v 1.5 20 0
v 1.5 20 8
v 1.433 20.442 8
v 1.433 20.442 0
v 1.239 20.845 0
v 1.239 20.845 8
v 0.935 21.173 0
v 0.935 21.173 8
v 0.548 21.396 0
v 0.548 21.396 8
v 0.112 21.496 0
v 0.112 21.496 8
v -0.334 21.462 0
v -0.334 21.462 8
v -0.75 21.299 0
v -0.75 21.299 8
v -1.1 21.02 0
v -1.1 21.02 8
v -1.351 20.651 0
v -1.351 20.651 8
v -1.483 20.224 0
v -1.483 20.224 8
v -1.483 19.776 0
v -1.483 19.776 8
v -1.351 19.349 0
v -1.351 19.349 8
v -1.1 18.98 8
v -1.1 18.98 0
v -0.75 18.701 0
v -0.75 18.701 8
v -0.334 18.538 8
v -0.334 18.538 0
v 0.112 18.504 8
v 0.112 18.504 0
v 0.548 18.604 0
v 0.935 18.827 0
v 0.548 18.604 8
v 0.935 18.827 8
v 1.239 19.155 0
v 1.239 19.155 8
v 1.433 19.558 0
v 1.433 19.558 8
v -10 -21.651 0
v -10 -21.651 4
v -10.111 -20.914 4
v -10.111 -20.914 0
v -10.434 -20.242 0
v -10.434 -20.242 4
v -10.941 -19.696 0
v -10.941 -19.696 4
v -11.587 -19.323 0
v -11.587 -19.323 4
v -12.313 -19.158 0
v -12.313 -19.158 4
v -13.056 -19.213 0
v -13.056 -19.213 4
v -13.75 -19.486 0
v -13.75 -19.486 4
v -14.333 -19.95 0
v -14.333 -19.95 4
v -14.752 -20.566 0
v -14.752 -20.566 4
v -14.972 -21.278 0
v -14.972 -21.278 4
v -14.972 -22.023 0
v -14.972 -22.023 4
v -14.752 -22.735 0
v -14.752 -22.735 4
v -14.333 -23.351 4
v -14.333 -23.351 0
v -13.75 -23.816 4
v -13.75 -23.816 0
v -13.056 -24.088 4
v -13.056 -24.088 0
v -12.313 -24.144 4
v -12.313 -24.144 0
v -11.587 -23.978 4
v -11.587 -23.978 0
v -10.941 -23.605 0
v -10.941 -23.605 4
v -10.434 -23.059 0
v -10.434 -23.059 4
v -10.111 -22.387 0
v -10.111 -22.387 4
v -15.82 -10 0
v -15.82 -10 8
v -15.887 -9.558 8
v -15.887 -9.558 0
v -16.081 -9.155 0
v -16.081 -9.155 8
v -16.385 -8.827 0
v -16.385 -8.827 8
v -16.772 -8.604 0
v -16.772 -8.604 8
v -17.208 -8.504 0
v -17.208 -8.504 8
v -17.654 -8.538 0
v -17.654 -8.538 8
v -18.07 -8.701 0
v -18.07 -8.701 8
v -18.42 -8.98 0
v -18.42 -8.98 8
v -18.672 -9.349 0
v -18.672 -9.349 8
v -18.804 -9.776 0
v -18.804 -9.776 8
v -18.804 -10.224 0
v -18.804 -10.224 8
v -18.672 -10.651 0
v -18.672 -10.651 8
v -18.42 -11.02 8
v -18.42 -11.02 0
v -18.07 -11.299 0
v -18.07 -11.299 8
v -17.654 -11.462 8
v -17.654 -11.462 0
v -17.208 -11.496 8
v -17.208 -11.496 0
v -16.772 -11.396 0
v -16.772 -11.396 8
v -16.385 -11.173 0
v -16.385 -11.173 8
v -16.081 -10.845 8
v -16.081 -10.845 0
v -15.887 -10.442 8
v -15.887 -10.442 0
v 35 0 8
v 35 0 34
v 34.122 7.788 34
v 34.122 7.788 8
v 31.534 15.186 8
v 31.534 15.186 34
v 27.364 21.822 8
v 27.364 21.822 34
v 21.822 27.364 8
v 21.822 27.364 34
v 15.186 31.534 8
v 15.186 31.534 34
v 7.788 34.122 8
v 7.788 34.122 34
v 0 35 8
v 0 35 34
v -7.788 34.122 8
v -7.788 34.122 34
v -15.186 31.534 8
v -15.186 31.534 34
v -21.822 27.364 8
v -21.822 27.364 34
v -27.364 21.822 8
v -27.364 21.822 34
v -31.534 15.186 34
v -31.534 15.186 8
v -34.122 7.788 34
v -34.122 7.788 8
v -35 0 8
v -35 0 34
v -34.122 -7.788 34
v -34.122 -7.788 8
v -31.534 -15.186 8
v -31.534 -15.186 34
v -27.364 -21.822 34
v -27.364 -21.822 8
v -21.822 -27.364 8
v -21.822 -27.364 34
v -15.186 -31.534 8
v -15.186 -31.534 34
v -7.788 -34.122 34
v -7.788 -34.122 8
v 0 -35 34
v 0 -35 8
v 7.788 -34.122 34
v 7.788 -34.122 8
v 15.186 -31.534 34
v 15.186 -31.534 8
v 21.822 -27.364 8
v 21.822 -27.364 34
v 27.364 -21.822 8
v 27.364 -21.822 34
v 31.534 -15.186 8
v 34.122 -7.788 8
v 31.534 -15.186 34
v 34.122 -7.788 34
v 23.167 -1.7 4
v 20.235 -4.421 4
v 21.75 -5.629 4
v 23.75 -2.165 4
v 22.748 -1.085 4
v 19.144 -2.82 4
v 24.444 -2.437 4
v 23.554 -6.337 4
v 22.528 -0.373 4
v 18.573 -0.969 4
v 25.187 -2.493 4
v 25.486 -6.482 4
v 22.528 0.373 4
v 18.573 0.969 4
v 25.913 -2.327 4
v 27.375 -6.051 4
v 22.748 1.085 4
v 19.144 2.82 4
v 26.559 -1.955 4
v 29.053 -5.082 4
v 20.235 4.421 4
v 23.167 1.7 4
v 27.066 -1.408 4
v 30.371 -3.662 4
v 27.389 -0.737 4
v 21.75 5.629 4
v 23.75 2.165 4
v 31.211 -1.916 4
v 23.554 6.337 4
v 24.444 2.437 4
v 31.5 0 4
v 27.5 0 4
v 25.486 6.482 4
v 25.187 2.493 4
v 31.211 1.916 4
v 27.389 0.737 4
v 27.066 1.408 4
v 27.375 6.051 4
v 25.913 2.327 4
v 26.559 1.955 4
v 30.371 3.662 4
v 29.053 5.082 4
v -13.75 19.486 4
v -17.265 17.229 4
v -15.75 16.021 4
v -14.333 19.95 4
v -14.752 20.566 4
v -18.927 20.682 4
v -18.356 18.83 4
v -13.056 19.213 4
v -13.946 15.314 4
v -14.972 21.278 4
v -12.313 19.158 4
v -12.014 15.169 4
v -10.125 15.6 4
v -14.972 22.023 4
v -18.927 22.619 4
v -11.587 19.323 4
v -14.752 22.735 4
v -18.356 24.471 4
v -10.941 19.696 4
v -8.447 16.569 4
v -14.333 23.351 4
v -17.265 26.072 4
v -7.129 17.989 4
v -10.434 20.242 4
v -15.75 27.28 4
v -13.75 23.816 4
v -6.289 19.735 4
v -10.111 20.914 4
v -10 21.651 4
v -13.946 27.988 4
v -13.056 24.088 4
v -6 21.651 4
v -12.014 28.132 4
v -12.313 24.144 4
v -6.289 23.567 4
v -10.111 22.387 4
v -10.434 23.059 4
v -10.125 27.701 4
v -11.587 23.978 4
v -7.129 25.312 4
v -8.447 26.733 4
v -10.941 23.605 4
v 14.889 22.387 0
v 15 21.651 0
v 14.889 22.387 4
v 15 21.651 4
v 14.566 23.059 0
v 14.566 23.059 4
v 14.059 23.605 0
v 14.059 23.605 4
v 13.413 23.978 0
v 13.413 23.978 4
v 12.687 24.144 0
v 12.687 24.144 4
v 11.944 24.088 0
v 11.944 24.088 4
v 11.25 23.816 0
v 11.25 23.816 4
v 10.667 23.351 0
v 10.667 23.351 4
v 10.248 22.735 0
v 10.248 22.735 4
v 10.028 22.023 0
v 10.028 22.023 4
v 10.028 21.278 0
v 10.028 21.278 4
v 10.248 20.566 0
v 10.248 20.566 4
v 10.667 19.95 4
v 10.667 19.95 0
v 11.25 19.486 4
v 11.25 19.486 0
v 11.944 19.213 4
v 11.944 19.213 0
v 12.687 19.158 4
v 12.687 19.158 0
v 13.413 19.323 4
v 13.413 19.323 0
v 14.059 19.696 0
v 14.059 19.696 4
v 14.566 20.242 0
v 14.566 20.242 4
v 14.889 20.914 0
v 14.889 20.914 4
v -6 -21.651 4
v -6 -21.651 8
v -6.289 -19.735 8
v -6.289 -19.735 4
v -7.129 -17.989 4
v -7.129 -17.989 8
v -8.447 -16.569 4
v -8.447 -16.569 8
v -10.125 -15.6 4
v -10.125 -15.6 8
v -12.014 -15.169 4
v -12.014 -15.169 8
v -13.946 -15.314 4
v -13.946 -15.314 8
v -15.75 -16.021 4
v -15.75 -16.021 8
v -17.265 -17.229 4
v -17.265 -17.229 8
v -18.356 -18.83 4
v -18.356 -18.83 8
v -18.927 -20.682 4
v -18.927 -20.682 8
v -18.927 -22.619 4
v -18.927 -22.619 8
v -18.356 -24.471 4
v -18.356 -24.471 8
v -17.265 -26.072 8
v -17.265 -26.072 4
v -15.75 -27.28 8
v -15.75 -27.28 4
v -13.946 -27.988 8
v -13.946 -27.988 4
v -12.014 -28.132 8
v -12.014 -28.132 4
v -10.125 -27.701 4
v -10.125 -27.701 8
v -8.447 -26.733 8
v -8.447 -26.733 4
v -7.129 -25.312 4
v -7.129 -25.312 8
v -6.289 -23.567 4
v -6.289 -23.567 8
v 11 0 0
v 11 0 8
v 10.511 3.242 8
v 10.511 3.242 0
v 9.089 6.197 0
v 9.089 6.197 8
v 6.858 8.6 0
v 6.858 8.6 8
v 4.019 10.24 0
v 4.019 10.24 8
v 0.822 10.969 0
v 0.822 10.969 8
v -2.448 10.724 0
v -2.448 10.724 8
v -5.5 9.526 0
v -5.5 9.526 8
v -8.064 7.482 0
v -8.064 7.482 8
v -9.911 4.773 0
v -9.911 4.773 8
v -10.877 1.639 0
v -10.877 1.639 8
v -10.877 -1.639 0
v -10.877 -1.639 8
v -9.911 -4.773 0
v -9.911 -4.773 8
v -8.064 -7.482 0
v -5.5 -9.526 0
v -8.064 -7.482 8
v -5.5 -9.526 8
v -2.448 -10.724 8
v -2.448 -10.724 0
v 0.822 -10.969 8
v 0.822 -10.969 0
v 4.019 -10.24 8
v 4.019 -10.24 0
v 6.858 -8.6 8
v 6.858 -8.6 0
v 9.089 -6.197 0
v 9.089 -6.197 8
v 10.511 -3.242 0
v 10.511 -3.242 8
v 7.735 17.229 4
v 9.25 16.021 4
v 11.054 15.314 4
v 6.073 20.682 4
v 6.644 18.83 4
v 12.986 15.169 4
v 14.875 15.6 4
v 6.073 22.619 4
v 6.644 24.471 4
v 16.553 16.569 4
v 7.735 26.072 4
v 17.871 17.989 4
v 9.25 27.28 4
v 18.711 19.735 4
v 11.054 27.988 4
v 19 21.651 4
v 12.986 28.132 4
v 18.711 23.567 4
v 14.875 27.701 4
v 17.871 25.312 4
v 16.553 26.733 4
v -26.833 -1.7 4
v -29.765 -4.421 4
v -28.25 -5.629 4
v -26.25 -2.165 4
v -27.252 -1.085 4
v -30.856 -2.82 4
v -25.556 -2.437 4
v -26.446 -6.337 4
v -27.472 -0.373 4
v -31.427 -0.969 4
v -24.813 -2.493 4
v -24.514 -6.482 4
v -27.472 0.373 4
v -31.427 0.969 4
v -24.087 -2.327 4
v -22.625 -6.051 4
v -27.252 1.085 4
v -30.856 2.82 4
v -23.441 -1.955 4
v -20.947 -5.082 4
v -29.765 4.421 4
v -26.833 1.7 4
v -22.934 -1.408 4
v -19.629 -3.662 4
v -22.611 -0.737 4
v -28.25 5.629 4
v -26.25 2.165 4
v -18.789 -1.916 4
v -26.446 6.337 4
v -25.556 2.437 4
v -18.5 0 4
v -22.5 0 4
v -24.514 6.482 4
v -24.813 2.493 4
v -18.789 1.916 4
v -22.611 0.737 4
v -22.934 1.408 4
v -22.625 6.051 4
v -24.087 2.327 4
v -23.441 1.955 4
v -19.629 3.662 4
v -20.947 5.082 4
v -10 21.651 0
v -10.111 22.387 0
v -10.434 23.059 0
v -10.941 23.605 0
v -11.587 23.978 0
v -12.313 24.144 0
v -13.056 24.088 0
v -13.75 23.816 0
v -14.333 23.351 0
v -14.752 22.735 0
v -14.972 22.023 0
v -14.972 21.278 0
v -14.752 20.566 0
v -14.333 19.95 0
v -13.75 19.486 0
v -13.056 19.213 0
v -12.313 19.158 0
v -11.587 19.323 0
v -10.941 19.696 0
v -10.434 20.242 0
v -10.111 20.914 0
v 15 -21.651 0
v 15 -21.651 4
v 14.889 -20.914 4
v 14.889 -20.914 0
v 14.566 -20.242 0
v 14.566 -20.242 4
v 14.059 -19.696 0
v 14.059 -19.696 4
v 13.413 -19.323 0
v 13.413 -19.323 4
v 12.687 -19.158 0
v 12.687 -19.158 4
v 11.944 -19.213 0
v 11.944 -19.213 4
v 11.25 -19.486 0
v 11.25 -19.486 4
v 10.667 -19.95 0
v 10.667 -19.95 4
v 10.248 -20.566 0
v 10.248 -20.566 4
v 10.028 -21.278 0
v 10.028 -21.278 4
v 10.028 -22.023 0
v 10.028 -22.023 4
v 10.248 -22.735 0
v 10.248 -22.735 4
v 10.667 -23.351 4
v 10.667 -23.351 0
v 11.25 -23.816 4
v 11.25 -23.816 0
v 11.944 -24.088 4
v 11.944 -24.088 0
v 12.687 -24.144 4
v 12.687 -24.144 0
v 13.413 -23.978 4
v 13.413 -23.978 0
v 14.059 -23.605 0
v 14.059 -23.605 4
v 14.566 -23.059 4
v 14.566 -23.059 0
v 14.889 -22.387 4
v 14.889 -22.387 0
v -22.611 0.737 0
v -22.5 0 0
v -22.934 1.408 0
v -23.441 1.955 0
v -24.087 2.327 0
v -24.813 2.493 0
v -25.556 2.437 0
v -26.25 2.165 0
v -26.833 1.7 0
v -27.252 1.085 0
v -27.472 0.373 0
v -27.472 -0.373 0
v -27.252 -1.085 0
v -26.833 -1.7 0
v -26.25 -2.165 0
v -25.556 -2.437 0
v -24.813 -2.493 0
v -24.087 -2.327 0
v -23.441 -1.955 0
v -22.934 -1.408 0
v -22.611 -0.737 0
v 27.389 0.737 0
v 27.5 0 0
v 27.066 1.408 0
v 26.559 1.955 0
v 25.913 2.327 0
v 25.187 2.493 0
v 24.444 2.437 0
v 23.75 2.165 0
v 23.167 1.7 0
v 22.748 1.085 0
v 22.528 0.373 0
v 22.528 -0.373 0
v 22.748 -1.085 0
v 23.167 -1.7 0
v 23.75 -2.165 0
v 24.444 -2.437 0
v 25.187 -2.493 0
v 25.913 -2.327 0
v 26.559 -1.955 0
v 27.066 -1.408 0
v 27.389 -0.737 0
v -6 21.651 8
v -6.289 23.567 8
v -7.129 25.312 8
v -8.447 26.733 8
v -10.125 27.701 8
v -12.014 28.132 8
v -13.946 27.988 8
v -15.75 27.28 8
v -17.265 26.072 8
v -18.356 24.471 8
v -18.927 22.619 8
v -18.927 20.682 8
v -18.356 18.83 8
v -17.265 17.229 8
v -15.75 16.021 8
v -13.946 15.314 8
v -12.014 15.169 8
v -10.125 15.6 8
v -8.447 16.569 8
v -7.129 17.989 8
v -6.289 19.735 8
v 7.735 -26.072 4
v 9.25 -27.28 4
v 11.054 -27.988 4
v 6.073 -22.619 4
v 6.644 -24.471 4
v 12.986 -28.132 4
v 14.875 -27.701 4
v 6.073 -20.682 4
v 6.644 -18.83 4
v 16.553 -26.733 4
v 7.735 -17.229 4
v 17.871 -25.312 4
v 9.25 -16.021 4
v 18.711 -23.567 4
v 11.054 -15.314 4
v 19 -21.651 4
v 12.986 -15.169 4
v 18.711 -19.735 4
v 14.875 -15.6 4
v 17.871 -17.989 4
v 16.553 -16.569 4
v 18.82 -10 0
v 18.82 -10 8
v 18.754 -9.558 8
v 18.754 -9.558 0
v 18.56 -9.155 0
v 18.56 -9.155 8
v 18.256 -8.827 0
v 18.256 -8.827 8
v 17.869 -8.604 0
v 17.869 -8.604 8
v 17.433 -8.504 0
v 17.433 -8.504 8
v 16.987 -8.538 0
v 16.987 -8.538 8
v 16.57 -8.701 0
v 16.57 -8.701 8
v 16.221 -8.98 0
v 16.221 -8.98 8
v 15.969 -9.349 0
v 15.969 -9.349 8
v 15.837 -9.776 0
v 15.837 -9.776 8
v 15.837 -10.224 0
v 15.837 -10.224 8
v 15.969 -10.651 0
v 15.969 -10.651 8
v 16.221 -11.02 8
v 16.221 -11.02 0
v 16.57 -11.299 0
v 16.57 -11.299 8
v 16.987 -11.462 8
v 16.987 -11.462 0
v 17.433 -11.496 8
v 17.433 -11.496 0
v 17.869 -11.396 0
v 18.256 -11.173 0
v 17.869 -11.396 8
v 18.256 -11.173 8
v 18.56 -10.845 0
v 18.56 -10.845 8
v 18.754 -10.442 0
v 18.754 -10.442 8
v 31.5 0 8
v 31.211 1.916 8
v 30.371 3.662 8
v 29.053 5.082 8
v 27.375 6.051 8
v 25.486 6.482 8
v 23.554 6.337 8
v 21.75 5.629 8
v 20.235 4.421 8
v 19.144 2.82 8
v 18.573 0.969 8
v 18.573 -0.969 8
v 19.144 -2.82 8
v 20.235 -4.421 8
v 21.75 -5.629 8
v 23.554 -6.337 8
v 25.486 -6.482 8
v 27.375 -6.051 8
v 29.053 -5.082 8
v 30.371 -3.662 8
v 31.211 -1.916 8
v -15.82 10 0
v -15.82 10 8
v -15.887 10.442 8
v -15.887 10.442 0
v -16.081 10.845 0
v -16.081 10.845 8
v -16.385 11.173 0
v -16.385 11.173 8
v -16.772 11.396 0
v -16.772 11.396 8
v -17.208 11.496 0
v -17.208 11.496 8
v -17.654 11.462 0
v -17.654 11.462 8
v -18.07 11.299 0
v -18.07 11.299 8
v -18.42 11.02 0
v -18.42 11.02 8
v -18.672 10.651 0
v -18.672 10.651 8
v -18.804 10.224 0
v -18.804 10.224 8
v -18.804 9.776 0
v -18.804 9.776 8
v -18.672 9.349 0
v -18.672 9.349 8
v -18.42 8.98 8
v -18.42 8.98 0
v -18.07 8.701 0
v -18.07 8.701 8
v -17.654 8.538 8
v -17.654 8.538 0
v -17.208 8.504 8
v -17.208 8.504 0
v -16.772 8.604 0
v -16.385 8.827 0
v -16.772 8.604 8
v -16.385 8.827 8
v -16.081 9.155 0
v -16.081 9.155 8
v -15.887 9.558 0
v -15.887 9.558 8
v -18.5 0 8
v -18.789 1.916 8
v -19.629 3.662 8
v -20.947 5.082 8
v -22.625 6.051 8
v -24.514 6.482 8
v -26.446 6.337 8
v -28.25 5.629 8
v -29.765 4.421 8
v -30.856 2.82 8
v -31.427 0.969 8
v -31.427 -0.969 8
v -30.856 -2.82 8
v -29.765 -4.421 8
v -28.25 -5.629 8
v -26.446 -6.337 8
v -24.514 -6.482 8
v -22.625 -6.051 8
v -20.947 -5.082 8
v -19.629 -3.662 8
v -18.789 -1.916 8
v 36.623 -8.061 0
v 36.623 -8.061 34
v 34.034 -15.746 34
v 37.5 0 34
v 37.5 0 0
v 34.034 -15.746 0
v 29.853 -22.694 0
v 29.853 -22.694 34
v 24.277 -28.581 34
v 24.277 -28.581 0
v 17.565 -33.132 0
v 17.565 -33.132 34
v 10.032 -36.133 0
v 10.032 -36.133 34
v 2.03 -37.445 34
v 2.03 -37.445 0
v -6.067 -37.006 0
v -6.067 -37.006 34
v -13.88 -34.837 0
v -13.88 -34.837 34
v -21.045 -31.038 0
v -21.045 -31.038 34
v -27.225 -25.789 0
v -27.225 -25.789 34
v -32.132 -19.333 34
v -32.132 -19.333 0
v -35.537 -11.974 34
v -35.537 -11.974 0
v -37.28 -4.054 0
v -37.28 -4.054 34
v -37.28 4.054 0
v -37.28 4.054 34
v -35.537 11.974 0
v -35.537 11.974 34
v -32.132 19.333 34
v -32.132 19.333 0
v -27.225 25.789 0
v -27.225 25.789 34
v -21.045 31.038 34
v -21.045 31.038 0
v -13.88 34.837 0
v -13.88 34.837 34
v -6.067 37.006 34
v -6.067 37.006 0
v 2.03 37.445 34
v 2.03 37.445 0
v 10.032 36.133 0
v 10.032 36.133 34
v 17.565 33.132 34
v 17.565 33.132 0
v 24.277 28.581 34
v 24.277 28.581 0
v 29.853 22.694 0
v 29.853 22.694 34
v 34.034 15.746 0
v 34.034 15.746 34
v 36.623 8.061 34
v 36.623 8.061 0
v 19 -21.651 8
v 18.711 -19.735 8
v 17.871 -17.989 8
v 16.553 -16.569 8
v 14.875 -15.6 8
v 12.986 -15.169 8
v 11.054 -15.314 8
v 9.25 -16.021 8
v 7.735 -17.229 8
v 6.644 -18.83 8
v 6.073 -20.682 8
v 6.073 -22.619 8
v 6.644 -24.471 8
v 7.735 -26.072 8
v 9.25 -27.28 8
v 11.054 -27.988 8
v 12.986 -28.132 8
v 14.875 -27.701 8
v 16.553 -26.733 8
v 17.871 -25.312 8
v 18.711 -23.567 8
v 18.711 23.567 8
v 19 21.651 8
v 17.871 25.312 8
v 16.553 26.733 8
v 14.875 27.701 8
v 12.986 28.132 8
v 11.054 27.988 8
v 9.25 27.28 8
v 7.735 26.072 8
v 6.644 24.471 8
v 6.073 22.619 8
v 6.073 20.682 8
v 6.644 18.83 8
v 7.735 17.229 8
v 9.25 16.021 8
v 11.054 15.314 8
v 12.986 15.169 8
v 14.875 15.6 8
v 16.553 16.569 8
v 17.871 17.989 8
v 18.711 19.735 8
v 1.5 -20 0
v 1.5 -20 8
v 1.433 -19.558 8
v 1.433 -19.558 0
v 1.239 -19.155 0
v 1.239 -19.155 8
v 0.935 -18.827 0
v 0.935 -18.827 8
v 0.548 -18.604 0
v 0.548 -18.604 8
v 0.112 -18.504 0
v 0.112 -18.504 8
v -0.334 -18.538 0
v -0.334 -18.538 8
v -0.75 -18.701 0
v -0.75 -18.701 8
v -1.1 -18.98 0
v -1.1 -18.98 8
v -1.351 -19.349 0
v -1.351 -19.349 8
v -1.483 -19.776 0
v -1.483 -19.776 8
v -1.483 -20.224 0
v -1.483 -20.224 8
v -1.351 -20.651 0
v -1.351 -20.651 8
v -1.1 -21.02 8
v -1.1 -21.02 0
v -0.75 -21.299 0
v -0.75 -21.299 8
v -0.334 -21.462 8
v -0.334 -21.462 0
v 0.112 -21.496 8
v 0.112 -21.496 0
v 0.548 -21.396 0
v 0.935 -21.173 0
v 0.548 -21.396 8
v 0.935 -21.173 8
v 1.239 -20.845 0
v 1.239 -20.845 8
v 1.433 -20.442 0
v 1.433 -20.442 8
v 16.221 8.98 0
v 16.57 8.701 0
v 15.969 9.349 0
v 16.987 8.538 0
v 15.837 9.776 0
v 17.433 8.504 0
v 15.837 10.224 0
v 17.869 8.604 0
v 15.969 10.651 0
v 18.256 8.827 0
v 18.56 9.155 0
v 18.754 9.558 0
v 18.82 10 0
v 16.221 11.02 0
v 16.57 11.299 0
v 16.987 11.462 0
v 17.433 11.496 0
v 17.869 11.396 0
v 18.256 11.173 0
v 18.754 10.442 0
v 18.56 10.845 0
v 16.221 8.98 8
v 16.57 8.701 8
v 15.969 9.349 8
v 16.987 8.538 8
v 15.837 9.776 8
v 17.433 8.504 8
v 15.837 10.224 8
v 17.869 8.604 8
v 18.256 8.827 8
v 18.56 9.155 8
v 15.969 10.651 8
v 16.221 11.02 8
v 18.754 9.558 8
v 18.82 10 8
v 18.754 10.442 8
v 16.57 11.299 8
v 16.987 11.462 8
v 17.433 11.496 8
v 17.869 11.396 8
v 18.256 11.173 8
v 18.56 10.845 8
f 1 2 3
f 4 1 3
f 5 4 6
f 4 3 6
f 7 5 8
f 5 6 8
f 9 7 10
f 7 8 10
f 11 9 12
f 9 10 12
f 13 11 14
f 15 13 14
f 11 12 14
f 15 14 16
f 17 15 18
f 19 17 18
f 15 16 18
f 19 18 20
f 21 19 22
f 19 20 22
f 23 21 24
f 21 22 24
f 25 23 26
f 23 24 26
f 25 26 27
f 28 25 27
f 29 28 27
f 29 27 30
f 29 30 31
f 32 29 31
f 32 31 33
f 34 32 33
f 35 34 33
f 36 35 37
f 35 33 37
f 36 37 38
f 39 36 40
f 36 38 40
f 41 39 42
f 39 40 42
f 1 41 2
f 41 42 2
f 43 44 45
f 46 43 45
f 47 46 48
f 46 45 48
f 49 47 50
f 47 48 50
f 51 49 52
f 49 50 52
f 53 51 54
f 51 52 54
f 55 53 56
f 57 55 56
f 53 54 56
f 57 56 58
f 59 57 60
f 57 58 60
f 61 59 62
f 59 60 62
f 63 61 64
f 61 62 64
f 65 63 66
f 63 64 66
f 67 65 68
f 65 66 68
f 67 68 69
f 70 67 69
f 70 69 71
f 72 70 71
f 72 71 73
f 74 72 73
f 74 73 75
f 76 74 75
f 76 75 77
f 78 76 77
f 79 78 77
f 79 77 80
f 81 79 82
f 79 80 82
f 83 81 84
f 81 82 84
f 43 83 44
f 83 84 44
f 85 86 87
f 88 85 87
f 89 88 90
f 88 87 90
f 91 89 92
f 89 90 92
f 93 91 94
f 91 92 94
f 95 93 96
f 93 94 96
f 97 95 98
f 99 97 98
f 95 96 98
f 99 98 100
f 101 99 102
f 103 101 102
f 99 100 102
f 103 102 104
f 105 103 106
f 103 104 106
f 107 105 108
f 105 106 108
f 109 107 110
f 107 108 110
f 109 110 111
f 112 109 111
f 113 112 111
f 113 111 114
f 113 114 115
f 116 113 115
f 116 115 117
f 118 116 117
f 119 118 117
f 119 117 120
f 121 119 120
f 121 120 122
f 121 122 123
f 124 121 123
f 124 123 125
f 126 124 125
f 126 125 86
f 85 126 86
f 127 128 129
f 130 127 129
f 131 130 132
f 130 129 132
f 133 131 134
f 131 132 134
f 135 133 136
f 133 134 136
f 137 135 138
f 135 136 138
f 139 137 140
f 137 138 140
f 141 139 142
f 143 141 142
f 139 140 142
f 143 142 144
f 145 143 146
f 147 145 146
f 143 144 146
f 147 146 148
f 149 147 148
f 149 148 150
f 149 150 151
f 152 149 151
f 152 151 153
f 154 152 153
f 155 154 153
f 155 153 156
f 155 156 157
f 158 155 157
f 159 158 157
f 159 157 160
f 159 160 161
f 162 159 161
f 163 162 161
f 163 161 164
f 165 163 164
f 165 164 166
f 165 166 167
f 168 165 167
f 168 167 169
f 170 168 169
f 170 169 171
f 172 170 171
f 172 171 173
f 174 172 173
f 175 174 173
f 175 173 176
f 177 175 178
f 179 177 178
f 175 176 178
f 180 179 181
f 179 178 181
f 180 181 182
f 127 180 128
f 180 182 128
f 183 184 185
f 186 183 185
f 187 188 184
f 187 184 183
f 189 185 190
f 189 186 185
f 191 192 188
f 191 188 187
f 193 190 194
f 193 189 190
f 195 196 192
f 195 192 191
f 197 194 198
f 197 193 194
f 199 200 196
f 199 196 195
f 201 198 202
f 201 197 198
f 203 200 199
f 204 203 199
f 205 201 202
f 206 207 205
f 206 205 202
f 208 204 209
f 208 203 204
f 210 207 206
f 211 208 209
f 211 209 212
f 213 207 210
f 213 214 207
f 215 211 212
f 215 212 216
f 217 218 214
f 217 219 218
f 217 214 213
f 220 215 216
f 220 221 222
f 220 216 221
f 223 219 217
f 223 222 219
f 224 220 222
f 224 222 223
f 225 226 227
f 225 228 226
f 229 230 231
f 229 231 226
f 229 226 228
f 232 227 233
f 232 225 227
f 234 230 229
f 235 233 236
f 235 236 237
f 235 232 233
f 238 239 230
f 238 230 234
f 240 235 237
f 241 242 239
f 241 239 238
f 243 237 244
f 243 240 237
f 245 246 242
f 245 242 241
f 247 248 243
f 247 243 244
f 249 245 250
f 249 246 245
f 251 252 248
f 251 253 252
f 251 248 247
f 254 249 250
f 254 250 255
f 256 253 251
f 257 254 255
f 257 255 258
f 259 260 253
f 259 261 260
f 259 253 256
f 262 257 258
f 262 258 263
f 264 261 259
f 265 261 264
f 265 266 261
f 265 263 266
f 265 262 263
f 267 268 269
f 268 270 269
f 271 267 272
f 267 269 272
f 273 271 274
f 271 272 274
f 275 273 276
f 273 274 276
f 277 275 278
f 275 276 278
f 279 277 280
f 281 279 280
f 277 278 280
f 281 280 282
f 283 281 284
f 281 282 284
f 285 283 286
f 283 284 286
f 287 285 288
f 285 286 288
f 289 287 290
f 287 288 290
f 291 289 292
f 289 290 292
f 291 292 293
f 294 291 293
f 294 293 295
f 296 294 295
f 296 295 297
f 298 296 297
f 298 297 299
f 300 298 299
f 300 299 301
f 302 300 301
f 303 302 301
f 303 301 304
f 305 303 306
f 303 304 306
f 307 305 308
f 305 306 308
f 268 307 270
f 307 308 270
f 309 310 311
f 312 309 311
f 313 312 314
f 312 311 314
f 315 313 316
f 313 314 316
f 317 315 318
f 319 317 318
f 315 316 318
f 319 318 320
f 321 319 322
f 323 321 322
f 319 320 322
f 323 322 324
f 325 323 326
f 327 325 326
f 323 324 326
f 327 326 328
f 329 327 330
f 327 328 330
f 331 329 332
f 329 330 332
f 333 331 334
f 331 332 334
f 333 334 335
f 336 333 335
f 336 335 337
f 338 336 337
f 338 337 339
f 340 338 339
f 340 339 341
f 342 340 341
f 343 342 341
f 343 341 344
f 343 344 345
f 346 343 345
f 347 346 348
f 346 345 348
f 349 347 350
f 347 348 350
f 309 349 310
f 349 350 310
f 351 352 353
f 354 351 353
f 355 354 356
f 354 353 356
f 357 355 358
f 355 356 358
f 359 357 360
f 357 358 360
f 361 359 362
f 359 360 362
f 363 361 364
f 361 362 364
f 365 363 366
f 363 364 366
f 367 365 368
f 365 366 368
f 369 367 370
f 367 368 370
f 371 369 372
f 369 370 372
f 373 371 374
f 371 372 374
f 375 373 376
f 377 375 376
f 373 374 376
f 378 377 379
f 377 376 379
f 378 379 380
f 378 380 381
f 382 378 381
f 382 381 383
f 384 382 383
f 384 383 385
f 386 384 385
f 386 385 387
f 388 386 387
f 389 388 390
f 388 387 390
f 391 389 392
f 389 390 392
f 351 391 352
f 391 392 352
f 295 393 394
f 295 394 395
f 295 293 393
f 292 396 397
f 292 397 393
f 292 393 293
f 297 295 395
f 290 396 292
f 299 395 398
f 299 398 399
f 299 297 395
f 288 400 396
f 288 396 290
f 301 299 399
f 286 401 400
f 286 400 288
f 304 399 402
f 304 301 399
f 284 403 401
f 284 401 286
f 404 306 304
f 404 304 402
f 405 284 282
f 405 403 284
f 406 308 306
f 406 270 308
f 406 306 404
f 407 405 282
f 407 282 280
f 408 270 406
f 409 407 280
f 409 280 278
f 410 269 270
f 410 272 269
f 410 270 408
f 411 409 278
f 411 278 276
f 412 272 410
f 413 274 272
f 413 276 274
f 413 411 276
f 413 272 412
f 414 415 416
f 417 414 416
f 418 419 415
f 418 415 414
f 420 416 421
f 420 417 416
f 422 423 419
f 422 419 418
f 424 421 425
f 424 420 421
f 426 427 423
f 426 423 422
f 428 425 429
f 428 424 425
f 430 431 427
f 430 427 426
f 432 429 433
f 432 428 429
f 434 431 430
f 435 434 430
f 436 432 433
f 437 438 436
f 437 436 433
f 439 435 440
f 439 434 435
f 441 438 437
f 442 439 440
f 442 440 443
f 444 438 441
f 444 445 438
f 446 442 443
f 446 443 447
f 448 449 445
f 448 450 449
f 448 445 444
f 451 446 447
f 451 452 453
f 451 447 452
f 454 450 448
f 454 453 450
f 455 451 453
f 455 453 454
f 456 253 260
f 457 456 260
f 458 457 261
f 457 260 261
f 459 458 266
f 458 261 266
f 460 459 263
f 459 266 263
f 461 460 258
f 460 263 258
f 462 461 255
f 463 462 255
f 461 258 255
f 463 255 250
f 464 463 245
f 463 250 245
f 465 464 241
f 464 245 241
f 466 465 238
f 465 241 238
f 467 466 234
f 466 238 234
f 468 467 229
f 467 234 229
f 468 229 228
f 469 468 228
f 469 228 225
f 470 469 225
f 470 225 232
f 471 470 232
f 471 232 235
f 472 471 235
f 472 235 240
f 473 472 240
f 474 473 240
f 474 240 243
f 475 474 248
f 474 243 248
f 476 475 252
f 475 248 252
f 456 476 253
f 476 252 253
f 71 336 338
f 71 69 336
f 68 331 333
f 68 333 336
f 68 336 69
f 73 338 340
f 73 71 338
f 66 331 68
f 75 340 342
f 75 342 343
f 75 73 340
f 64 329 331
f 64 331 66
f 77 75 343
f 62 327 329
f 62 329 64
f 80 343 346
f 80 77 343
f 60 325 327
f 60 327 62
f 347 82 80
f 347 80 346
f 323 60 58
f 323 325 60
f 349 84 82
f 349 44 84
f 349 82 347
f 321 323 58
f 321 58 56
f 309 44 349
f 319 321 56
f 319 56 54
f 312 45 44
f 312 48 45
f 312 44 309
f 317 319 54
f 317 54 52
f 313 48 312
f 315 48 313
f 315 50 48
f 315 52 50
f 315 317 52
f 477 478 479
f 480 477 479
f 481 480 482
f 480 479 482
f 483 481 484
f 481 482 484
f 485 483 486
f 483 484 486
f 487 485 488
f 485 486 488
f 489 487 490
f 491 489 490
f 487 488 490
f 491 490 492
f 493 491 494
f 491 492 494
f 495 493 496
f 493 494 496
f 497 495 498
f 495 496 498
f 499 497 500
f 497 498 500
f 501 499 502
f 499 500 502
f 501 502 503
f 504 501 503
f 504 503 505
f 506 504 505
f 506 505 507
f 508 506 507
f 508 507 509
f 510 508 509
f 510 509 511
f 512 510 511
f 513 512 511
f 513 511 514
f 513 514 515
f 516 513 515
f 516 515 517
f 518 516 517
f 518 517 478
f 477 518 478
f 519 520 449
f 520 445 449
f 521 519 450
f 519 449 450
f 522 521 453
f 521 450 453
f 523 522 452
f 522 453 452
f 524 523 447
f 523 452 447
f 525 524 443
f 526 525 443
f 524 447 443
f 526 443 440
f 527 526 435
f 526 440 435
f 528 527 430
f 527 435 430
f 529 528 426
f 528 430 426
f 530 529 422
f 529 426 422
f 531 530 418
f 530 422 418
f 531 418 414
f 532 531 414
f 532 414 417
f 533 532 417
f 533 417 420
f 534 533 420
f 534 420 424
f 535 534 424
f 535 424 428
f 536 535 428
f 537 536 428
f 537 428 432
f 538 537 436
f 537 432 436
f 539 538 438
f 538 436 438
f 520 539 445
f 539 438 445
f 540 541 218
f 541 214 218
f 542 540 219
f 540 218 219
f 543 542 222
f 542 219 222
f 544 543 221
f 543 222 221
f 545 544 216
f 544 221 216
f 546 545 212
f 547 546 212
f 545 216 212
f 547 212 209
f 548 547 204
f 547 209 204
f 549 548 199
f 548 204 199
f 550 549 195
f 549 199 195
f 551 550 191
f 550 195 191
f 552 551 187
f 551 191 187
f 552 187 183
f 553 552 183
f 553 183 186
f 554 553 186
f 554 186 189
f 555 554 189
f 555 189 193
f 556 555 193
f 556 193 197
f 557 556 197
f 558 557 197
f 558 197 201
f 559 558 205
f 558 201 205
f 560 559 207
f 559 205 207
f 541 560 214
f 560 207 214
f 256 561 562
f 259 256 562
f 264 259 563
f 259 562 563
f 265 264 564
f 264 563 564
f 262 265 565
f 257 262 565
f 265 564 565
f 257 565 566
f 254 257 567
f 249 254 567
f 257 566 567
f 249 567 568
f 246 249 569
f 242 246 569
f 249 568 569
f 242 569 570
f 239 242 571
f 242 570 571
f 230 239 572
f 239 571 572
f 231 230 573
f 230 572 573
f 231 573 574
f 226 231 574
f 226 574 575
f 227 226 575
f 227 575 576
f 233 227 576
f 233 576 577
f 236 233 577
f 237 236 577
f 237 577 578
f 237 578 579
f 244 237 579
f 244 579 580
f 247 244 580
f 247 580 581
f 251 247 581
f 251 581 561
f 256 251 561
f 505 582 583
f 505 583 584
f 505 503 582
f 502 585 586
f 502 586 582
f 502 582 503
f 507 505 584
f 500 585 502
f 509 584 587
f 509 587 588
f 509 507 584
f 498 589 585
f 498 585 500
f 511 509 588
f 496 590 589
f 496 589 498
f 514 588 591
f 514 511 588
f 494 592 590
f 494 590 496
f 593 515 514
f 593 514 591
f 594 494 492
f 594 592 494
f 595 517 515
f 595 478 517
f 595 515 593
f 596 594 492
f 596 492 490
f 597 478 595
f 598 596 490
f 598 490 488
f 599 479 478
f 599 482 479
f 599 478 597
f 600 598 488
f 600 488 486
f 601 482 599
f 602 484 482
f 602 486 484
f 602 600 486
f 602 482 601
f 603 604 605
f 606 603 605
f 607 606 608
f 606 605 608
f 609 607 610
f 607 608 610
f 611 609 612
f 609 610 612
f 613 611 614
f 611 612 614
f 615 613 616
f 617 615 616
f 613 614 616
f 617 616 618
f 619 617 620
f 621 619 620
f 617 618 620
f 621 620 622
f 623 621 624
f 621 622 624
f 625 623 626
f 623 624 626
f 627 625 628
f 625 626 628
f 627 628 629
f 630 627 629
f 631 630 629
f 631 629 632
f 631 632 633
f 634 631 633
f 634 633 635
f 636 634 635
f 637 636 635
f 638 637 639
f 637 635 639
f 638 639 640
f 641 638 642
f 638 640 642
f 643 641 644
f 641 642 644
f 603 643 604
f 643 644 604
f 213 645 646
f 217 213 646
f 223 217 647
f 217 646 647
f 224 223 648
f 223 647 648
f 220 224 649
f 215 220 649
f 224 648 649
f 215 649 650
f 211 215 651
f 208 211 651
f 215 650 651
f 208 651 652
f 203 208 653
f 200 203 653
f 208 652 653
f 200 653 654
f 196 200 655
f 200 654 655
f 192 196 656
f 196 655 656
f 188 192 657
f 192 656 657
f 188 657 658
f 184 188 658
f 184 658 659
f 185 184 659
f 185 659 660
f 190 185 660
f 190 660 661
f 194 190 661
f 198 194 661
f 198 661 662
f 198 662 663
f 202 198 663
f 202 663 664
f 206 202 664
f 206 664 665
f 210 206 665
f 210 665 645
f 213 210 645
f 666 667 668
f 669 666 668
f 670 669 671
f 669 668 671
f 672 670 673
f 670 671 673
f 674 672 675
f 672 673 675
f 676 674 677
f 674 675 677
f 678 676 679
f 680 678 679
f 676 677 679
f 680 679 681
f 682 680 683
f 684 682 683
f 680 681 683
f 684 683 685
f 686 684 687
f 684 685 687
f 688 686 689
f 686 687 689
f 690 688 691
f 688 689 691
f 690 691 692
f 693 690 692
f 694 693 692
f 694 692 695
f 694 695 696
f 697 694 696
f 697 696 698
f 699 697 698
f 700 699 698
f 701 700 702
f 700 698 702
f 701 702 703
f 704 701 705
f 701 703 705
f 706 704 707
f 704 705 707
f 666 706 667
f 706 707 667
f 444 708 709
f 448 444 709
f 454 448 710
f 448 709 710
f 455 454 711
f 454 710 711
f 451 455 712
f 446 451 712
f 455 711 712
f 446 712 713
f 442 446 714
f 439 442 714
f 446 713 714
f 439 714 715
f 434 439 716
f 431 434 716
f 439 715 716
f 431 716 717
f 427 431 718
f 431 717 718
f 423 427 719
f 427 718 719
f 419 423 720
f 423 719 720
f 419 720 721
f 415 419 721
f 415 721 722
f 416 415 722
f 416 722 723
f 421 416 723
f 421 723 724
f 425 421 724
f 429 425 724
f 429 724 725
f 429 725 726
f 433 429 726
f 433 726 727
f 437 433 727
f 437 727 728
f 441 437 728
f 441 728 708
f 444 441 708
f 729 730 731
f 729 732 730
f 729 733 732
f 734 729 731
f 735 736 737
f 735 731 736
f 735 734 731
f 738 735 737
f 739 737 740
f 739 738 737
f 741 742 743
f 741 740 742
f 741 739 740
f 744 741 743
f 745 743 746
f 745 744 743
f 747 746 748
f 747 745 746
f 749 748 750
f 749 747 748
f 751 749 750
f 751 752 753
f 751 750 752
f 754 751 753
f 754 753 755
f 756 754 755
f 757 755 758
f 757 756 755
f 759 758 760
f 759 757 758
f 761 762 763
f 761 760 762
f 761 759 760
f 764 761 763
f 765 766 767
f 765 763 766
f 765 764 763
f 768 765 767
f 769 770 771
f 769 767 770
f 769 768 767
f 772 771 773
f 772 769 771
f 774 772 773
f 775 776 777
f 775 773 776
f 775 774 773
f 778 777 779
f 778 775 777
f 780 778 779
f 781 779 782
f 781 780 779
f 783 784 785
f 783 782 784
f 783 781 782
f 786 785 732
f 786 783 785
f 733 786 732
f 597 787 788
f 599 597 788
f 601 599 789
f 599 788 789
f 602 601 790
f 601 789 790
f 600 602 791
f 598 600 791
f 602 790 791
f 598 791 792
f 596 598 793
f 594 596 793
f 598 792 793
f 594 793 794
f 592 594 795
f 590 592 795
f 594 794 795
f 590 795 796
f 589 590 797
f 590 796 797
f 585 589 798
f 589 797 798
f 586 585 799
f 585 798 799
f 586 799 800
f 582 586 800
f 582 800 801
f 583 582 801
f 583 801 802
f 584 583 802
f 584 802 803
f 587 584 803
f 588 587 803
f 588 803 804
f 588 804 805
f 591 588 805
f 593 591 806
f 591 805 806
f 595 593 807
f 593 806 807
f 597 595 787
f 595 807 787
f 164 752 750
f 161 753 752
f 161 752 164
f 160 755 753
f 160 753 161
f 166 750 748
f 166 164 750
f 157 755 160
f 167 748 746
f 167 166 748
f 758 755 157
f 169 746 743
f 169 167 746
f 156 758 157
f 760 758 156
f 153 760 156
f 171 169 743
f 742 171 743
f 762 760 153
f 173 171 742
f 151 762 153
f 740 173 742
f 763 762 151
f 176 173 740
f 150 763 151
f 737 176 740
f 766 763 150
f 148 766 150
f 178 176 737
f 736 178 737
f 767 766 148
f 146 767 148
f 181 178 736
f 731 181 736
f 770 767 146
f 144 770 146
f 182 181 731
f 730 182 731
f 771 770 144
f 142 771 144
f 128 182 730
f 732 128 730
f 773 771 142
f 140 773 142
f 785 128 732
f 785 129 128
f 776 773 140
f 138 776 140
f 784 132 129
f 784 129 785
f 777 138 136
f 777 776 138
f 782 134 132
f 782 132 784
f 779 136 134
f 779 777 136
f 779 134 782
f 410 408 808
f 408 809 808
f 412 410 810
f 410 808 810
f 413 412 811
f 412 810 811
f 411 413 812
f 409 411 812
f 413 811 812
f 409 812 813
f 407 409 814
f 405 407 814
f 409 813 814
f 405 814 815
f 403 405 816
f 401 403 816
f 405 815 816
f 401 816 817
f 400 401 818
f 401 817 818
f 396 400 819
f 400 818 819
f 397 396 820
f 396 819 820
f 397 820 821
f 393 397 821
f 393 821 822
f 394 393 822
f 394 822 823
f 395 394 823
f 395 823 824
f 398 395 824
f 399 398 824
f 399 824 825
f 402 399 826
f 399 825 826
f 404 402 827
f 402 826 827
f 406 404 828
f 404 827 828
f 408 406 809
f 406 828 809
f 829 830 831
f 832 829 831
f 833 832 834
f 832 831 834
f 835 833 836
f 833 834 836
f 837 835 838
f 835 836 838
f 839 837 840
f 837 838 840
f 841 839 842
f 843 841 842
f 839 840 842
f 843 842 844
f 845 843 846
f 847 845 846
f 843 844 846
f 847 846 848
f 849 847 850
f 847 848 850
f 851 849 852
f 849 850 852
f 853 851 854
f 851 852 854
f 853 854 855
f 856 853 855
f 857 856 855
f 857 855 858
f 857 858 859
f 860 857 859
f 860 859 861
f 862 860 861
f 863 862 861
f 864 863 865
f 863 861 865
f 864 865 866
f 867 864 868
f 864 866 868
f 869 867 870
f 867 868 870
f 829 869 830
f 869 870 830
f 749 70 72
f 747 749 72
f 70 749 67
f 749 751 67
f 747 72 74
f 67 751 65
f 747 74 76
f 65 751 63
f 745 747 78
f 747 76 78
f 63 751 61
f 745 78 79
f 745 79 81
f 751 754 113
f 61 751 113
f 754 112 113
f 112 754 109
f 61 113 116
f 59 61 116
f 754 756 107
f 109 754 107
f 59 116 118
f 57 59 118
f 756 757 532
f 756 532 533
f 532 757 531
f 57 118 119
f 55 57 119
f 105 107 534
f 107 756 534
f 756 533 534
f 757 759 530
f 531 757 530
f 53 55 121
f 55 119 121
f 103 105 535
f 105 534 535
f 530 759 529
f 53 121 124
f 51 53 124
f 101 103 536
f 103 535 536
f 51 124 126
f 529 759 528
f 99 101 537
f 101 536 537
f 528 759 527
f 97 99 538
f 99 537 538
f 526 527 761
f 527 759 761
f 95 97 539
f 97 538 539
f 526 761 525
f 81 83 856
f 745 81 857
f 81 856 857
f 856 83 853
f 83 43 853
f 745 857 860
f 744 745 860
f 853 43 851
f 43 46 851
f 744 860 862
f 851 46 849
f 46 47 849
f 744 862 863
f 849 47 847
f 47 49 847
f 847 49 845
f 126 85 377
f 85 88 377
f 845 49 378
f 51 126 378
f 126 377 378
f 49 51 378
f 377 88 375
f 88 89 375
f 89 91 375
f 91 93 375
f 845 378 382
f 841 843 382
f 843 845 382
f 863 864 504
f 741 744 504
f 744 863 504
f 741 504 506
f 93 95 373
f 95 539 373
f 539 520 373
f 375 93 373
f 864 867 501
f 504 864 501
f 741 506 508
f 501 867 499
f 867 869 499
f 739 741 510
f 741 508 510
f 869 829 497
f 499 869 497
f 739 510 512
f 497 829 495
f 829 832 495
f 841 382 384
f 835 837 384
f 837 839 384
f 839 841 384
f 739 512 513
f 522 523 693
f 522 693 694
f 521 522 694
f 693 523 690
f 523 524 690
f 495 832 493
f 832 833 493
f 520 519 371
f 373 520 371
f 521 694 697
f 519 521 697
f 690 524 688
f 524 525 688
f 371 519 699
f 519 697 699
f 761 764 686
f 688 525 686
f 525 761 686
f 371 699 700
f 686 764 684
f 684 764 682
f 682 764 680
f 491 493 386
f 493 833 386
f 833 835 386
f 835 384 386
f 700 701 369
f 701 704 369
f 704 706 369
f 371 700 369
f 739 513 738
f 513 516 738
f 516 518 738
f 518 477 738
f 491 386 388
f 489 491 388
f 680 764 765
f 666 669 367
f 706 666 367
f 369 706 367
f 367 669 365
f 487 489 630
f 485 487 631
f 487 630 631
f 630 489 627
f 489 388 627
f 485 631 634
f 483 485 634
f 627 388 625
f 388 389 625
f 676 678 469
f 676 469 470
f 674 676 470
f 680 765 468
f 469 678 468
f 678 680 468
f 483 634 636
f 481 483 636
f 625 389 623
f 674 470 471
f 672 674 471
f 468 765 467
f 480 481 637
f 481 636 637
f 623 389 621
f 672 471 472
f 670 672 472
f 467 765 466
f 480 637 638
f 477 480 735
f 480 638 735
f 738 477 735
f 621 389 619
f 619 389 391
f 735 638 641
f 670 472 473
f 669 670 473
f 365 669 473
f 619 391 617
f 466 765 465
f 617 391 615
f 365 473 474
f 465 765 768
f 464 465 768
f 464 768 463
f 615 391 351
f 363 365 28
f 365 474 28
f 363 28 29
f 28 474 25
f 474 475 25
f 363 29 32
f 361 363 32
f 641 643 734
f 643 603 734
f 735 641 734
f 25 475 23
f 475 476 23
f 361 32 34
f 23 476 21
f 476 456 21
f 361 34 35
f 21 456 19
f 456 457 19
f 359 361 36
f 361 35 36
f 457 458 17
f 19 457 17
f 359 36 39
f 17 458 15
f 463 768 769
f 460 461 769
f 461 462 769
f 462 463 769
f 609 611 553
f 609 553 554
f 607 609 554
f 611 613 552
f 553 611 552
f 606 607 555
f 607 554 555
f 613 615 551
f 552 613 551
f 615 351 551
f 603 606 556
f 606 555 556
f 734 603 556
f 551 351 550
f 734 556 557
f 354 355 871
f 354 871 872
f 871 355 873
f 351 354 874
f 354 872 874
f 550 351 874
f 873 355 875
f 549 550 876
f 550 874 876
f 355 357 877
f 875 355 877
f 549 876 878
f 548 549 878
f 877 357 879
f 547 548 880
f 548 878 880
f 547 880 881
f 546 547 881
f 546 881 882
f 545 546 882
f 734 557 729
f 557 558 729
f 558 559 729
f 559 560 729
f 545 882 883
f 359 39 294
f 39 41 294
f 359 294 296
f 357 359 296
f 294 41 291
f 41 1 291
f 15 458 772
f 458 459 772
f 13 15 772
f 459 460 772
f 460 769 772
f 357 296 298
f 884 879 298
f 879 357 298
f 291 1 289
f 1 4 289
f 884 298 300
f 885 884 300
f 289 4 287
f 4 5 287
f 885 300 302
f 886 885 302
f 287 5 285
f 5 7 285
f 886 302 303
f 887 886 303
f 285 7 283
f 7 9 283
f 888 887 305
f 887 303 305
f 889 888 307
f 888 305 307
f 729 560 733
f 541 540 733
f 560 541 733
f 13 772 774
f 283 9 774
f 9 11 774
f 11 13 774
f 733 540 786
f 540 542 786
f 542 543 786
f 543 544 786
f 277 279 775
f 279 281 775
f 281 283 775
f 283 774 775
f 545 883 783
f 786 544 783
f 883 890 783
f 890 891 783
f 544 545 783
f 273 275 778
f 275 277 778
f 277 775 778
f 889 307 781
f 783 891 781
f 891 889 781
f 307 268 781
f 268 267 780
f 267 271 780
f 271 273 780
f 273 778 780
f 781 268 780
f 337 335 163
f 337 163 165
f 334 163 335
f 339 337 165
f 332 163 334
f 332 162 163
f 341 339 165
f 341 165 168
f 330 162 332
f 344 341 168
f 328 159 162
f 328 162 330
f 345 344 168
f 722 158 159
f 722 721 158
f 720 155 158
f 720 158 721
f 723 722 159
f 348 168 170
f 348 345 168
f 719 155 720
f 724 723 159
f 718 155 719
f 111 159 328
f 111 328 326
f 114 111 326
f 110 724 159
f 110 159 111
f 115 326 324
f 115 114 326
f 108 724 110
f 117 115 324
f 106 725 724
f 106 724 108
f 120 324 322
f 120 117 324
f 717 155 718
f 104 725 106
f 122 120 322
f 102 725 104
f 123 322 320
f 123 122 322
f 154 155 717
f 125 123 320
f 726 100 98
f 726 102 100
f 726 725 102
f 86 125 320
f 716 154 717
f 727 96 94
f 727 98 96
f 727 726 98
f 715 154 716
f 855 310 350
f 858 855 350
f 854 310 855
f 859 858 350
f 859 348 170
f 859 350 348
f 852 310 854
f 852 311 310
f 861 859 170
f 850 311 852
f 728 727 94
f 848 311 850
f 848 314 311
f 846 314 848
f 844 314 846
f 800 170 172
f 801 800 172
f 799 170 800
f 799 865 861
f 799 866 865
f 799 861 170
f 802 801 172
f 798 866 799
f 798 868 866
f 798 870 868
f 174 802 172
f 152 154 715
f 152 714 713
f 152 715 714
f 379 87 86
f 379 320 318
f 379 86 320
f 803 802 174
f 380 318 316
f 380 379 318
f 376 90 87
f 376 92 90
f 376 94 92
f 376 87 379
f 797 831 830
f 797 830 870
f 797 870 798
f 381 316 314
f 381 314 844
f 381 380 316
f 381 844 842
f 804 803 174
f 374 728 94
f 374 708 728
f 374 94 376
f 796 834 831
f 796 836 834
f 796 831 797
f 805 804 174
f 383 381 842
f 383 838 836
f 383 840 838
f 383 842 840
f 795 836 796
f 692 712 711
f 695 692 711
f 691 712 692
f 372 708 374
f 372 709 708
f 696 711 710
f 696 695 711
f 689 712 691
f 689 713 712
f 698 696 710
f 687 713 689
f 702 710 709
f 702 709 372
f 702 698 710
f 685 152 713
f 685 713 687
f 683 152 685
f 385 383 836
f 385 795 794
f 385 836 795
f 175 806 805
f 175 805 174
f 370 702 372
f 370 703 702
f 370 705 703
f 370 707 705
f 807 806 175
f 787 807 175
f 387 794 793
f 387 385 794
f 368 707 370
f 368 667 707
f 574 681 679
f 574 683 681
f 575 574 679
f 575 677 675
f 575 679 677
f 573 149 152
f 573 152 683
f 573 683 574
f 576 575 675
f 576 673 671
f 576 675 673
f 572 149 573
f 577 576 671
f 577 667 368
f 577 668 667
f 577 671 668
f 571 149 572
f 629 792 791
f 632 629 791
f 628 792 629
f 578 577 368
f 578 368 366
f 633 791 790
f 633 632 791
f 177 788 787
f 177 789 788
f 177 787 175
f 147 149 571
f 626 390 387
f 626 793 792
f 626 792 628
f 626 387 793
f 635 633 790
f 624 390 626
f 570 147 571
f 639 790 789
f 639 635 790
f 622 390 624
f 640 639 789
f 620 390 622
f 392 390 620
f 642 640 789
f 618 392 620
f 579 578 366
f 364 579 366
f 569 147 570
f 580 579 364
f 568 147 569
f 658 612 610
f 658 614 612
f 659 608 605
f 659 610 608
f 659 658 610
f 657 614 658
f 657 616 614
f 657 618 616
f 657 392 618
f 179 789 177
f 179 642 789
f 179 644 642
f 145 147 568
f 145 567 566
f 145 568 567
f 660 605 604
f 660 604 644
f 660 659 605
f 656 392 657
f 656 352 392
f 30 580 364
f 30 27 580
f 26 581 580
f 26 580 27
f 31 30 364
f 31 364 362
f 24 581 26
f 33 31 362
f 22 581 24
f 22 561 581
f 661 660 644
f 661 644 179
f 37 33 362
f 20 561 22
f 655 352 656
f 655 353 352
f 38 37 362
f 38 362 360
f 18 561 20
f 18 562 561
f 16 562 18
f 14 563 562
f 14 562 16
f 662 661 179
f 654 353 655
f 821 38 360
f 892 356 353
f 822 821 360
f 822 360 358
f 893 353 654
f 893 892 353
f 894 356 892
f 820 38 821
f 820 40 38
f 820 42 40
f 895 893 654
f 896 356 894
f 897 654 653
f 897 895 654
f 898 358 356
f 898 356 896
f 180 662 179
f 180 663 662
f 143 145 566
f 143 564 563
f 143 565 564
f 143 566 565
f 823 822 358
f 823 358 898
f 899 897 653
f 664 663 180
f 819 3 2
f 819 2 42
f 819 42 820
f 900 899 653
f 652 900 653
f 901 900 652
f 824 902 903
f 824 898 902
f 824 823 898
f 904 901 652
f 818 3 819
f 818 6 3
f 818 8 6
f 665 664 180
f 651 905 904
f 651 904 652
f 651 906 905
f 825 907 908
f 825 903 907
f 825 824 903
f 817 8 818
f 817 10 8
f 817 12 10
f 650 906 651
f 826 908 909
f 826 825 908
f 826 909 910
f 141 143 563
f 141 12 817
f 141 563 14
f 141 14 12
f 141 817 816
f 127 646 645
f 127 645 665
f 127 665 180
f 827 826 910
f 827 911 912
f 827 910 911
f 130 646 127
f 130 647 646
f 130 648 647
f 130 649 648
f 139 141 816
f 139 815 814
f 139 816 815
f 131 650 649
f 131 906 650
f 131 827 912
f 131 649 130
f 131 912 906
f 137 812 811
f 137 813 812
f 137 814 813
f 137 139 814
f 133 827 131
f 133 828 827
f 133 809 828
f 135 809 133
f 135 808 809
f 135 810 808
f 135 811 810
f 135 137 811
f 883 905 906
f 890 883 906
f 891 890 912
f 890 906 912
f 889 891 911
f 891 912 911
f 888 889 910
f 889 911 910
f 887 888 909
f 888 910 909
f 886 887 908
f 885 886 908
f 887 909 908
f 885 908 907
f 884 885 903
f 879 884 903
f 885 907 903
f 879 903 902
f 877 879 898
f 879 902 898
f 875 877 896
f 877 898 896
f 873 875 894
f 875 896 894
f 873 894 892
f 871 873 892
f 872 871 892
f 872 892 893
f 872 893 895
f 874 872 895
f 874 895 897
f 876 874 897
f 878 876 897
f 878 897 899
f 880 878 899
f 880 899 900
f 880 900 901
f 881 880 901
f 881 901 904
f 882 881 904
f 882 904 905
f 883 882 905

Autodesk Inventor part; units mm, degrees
ref_plane "YZ Plane" through (0, 0, 0) normal (1, 0, 0) x (0, 1, 0)
ref_plane "XZ Plane" through (0, 0, 0) normal (0, 1, 0) x (-1, 0, 0)
ref_plane "XY Plane" through (0, 0, 0) normal (0, 0, 1) x (1, 0, 0)
sketch "Sketch1" plane through (0, 0, 0) normal (0, 0, 1) x (1, 0, 0)
  circle A0 centre (0, 0) radius 37.5
  dimension "d0" = 75
extrude "Extrusion1" add sketch "Sketch1" along normal blind 34
sketch "Sketch2" plane through (0, 0, 34) normal (0, 0, 1) x (1, 0, 0)
  circle A0 centre (0, 0) radius 37.5 projected
  circle A1 centre (0, 0) radius 35
  dimension "d105" = 70
extrude "Extrusion2" cut sketch "Sketch2" against normal blind 26 contours A1
sketch "Sketch3" plane through (0, 0, 8) normal (0, 0, 1) x (1, 0, 0)
  circle A0 centre (0, 0) radius 11
  dimension "d6" = 22
extrude "Extrusion3" cut sketch "Sketch3" against normal through all
sketch "Sketch4" plane through (0, 0, 8) normal (0, 0, 1) x (1, 0, 0)
  circle A0 centre (25, 0) radius 6.5
  circle A1 centre (12.5, 21.6506) radius 6.5
  circle A2 centre (-12.5, 21.6506) radius 6.5
  circle A3 centre (-25, 0) radius 6.5
  circle A4 centre (-12.5, -21.6506) radius 6.5
  circle A5 centre (12.5, -21.6506) radius 6.5
  point P0 (0, 0)
  dimension "d9" = 13
  dimension "d10" = 25
  dimension "d13" = 360
extrude "Extrusion4" cut sketch "Sketch4" against normal blind 4
sketch "Sketch5" plane through (0, 0, 8) normal (0, 0, 1) x (1, 0, 0)
  circle A0 centre (0, 0) radius 11 construction
  circle A1 centre (25, 0) radius 2.5
  circle A2 centre (12.5, 21.6506) radius 2.5
  circle A3 centre (-12.5, 21.6506) radius 2.5
  circle A4 centre (-25, 0) radius 2.5
  circle A5 centre (-12.5, -21.6506) radius 2.5
  circle A6 centre (12.5, -21.6506) radius 2.5
  dimension "d99" = 5
  dimension "d100" = 25
  dimension "d103" = 360
extrude "Extrusion5" cut sketch "Sketch5" against normal through all
sketch "Sketch6" plane through (0, 0, 8) normal (0, 0, 1) x (1, 0, 0)
  circle A0 centre (0, 20) radius 1.5
  circle A1 centre (-17.3205, 10) radius 1.5
  circle A2 centre (-17.3205, -10) radius 1.5
  circle A3 centre (0, -20) radius 1.5
  circle A4 centre (17.3205, -10) radius 1.5
  circle A5 centre (17.3205, 10) radius 1.5
  point P0 (0, 0)
  dimension "d24" = 3
  dimension "d25" = 20
  dimension "d28" = 360
extrude "Extrusion6" cut sketch "Sketch6" against normal through all
properties part number "Base" material "ABS Plastic"
